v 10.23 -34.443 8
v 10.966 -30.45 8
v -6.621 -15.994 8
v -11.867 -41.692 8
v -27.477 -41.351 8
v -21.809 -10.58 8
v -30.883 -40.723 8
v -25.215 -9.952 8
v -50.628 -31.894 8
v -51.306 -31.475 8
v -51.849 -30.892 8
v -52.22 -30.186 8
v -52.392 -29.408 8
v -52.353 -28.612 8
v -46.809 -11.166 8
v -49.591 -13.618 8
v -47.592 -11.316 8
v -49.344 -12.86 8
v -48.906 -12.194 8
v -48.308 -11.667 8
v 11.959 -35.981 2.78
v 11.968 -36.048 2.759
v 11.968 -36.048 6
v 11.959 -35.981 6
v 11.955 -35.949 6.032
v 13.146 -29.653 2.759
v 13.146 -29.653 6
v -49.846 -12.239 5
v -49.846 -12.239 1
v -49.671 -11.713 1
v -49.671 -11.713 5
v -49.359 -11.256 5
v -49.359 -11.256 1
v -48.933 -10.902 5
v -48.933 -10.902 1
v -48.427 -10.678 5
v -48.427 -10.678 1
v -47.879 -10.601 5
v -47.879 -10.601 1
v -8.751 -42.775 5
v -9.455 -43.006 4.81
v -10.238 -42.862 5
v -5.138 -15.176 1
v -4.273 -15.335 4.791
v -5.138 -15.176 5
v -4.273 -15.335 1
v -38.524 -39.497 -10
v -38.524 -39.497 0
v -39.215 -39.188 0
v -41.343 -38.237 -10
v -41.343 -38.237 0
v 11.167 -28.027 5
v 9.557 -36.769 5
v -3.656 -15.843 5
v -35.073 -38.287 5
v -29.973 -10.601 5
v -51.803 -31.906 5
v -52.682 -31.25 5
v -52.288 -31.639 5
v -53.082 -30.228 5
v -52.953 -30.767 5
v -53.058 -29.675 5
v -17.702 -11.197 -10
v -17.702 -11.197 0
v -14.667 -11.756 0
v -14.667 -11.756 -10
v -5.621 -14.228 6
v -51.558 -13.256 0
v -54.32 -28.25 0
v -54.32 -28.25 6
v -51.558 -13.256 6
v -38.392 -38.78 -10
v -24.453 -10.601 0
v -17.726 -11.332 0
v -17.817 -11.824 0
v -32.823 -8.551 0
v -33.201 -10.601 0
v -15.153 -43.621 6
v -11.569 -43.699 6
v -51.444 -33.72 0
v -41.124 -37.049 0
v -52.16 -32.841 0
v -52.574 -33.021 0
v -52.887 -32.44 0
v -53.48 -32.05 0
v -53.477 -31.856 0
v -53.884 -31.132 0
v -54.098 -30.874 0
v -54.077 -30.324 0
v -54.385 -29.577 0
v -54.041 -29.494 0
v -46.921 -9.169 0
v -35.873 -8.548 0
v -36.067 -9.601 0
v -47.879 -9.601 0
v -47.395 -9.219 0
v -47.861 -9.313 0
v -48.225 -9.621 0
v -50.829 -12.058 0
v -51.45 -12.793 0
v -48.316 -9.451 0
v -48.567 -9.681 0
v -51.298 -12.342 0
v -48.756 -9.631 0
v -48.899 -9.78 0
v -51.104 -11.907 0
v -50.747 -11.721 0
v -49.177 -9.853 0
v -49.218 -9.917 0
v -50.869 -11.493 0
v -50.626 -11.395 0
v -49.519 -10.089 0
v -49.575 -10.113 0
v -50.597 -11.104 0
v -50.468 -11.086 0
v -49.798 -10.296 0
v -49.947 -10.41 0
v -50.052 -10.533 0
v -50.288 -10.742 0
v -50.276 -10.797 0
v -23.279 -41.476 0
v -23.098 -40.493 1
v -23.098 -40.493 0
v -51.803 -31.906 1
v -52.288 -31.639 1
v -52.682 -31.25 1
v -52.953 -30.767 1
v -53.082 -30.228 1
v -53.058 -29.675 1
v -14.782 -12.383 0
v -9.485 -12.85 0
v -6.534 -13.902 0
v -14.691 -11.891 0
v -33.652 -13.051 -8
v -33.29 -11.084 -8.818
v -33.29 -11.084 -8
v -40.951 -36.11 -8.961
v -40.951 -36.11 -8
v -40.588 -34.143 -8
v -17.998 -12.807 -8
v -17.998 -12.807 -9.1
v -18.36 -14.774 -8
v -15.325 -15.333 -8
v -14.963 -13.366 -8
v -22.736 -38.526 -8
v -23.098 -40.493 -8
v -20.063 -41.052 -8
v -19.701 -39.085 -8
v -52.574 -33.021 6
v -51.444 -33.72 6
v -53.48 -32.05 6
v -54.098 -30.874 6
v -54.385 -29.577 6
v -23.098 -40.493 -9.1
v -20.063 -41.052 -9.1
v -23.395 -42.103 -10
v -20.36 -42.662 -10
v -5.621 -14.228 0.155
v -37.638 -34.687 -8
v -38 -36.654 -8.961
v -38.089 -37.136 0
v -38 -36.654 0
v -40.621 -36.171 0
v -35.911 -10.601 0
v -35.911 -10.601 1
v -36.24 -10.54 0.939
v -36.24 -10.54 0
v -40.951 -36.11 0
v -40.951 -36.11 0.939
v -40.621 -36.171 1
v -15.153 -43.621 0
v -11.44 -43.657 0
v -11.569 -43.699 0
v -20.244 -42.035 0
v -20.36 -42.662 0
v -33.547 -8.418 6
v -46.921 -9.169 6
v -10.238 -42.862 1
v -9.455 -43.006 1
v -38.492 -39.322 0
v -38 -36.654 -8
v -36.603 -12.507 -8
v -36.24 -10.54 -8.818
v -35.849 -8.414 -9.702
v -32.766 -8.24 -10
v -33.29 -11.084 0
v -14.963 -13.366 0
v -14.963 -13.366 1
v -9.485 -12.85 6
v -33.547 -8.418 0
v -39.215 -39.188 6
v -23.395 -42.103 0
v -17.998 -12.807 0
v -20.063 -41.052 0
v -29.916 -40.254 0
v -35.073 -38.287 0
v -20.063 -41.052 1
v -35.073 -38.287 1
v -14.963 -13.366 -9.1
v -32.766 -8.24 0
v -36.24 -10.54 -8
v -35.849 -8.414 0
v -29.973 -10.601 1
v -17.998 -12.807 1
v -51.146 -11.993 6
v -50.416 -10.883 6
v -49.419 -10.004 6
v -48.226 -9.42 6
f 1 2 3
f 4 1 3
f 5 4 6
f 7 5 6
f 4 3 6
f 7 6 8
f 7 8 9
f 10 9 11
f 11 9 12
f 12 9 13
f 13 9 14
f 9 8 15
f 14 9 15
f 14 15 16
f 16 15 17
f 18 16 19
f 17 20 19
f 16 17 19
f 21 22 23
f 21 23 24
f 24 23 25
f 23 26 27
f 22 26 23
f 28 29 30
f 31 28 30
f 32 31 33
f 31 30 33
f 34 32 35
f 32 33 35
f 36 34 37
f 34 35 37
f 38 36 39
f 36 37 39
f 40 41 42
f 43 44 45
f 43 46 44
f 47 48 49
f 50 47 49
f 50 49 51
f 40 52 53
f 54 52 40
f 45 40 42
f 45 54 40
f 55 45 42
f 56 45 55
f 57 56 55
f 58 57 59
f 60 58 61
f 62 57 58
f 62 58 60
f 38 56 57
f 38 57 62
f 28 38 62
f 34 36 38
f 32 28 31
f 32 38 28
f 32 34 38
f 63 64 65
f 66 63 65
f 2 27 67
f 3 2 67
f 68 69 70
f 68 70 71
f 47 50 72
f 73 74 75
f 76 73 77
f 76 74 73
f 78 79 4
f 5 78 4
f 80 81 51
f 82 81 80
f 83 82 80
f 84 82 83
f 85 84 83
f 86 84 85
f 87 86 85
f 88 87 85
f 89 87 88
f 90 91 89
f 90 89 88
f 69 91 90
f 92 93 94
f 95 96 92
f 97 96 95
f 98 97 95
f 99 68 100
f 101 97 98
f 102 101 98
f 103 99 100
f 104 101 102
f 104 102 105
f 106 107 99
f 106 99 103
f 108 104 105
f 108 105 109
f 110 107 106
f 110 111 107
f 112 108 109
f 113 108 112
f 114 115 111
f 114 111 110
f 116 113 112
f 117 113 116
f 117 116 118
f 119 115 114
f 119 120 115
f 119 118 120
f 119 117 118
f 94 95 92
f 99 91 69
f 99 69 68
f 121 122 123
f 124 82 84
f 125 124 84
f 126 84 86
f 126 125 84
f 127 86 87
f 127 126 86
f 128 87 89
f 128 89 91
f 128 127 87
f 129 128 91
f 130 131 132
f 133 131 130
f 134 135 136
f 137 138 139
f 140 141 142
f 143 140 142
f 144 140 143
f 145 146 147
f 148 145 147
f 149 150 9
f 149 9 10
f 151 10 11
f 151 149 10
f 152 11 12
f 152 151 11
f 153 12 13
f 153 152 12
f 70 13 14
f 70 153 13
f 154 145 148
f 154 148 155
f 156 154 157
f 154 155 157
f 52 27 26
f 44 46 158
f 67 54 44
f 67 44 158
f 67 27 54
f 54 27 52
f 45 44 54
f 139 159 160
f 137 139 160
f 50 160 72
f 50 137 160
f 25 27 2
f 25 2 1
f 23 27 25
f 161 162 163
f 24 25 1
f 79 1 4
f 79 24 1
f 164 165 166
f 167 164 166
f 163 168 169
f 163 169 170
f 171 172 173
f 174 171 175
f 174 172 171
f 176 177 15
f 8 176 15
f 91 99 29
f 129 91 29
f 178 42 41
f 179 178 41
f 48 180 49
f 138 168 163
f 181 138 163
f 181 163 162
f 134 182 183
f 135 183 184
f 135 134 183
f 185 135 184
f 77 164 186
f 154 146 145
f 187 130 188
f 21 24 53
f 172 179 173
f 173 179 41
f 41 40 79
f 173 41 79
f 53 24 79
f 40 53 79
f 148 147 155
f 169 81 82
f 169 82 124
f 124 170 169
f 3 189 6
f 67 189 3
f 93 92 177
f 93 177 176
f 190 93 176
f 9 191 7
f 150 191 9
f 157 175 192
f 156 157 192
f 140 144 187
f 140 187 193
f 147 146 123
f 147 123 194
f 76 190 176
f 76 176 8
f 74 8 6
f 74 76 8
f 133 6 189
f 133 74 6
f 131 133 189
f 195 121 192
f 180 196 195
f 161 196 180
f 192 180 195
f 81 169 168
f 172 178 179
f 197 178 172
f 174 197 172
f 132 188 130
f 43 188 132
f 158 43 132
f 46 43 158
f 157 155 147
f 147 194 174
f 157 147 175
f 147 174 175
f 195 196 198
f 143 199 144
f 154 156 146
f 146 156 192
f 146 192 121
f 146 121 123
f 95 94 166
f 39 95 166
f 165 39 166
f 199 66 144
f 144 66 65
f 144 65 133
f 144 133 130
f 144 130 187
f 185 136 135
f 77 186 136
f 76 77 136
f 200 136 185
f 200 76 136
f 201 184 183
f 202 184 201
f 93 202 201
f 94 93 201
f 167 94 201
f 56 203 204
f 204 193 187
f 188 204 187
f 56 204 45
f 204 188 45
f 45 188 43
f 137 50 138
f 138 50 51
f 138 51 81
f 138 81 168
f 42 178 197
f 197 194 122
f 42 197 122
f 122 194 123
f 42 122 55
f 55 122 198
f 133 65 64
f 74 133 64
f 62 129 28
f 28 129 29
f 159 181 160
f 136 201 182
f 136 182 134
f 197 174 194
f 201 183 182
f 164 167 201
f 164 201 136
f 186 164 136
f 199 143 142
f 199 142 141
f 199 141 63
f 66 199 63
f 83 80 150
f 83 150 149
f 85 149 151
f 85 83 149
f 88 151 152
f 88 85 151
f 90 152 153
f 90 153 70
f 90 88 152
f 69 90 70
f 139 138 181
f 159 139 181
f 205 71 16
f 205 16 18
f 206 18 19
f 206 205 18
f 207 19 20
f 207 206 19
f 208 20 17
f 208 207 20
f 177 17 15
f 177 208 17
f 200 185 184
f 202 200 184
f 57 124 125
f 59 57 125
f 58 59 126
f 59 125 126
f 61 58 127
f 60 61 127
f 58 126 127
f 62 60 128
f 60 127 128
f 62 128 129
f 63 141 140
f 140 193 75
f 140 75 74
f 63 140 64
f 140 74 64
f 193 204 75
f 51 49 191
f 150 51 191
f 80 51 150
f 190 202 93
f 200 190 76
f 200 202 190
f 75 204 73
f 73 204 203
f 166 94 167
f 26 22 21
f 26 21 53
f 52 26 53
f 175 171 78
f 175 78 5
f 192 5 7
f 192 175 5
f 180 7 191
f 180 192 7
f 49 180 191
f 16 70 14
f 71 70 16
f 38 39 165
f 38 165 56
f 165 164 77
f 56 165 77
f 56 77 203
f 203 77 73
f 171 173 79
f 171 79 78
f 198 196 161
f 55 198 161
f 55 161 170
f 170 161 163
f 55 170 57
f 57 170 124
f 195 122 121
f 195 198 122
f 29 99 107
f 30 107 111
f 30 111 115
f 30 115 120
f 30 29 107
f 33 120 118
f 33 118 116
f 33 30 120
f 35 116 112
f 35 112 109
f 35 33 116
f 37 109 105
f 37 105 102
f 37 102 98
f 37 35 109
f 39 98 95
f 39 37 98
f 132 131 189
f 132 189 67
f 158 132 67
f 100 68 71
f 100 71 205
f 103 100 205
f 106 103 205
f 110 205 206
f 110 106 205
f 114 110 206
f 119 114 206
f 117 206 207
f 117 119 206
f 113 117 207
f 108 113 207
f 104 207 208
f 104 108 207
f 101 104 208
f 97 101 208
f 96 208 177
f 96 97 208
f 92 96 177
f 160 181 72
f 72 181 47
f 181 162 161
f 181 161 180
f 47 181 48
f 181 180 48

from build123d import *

# Parameters (mm, degrees)
BOSS_EXTRUDE1_DEPTH = 8
CUT_EXTRUDE1_DEPTH  = 5
CHAMFER1_SIZE       = 2
CHAMFER2_SIZE       = 2
BOSS_EXTRUDE2_DEPTH = 10
CHAMFER3_SIZE       = 5
CHAMFER5_SIZE       = 1
SKETCH4_W           = 3
SKETCH4_H           = 2
BOSS_EXTRUDE3_DEPTH = 2
CUT_EXTRUDE2_REACH  = 71.587
SKETCH8_W           = 3
SKETCH8_H           = 2
BOSS_EXTRUDE6_DEPTH = 2
SKETCH10_W          = 3.086016113
SKETCH10_H          = 2
BOSS_EXTRUDE7_DEPTH = 2
CUT_EXTRUDE6_REACH  = 65.526
CUT_EXTRUDE7_REACH  = 69.221
SKETCH14_W          = 3.086016113
SKETCH14_H          = 2
BOSS_EXTRUDE8_DEPTH = 2
CUT_EXTRUDE8_REACH  = 65.526
CUT_EXTRUDE9_DEPTH  = 10
CHAMFER6_SIZE       = 2


with BuildPart() as part:
    # Sketch1 → Boss-Extrude1 (new body)
    with BuildSketch(Plane.XY):
        with BuildLine():
            Line((-54.320190505, -28.24959399), (-51.558117567, -13.255731212))
            ThreePointArc((-51.558117567, -13.255731212), (-49.946755328, -10.410422216), (-46.921489424, -9.169439639))
            Line((-46.921489424, -9.169439639), (-33.546710063, -8.417567807))
            Line((-33.546710063, -8.417567807), (-9.484938073, -12.850072643))
            Line((-9.484938073, -12.850072643), (10.646906462, -20.027114874))
            ThreePointArc((10.646906462, -20.027114874), (13.299313006, -22.239005538), (13.885164949, -25.64260632))
            Line((13.885164949, -25.64260632), (11.241158147, -39.995549222))
            ThreePointArc((11.241158147, -39.995549222), (9.480940353, -42.966972131), (6.214468276, -44.088525055))
            Line((6.214468276, -44.088525055), (-15.153318385, -43.620772213))
            Line((-15.153318385, -43.620772213), (-39.215090375, -39.188267377))
            Line((-39.215090375, -39.188267377), (-51.444007577, -33.719847285))
            ThreePointArc((-51.444007577, -33.719847285), (-53.828484174, -31.482316748), (-54.320190505, -28.24959399))
        make_face()
    extrude(amount=BOSS_EXTRUDE1_DEPTH)

    # Sketch2 → Cut-Extrude1 (cut)
    with BuildSketch(Plane(origin=(0, 0, 0), x_dir=(-1, 0, 0), z_dir=(0, 0, -1))):
        with BuildLine():
            Line((53.057588595, -29.675312755), (49.84553587, -12.238742878))
            ThreePointArc((49.84553587, -12.238742878), (49.158345119, -11.064085999), (47.878630558, -10.601073521))
            Line((47.878630558, -10.601073521), (29.973319258, -10.601073521))
            Line((29.973319258, -10.601073521), (5.137929069, -15.176089324))
            Line((5.137929069, -15.176089324), (-10.10107167, -22.031458568))
            Line((-10.10107167, -22.031458568), (-10.675035013, -22.289659923))
            ThreePointArc((-10.675035013, -22.289659923), (-11.625784949, -23.184821715), (-11.821428067, -24.475931255))
            Line((-11.821428067, -24.475931255), (-8.921987001, -40.215494417))
            ThreePointArc((-8.921987001, -40.215494417), (-8.27911868, -41.352138774), (-7.071800124, -41.849755071))
            Line((-7.071800124, -41.849755071), (-6.443506549, -41.886484392))
            Line((-6.443506549, -41.886484392), (10.237987778, -42.861665394))
            Line((10.237987778, -42.861665394), (35.073377967, -38.286649591))
            Line((35.073377967, -38.286649591), (51.803353349, -31.906359903))
            ThreePointArc((51.803353349, -31.906359903), (52.834077643, -31.017733243), (53.057588595, -29.675312755))
        make_face()
    extrude(amount=-CUT_EXTRUDE1_DEPTH, mode=Mode.SUBTRACT)

    # Chamfer1
    chamfer1_edges = [part.edges().sort_by_distance(p)[0] for p in [
        (-4.469425054, -43.854648634, 8),
        (9.480940353, -42.966972131, 8),
        (12.563161548, -32.819077771, 8),
        (13.299313006, -22.239005538, 8),
        (0.580984195, -16.438593758, 8),
    ]]
    chamfer(chamfer1_edges, length=CHAMFER1_SIZE)

    # Chamfer2
    chamfer2_edges = [part.edges().sort_by_distance(p)[0] for p in [
        (-49.946755328, -10.410422216, 8),
        (-52.939154036, -20.752662601, 8),
        (-53.828484174, -31.482316748, 8),
        (-45.329548976, -36.454057331, 8),
        (-40.234099743, -8.793503723, 8),
    ]]
    chamfer(chamfer2_edges, length=CHAMFER2_SIZE)

    # Sketch3 → Boss-Extrude2 (add)
    with BuildSketch(Plane(origin=(0, 0, 0), x_dir=(-1, 0, 0), z_dir=(0, 0, -1))):
        Polygon((23.394716564, -42.102594861), (23.098142943, -40.492650345), (20.063192201, -41.051729445), (20.359765822, -42.661673961), align=None)
        Polygon((38.000366847, -36.653655449), (38.524189699, -39.49721829), (41.342508001, -38.236947396), (40.950724814, -36.110159485), align=None)
        Polygon((33.290068494, -11.083886396), (32.766245641, -8.240323555), (35.848643275, -8.413602522), (36.240426461, -10.540390432), align=None)
        Polygon((14.963133492, -13.366153375), (17.998084234, -12.807074275), (17.701510612, -11.197129759), (14.66655987, -11.756208859), align=None)
    extrude(amount=BOSS_EXTRUDE2_DEPTH)

    # Chamfer3
    # the kernel refuses this chamfer: 5 mm, written as the material it takes off along each edge
    with BuildSketch(Plane(origin=(-23.074487459, -43.612072424, 0), x_dir=(0.05833715256734155, -0.9979182097746037, -0.027495876610586372), z_dir=(0.998295648476819, 0.05835921720043501, 0))) as chamfer3_piece_1_section:
        Polygon((CHAMFER3_SIZE * 0.999621916911, -CHAMFER3_SIZE * 0.0274958766106), (-CHAMFER3_SIZE * 0.0274958766106, -CHAMFER3_SIZE * 0.999621916911), (0, 0), align=None)
    chamfer3_piece_1 = extrude(amount=30.197755173, mode=Mode.PRIVATE)
    chamfer3_piece_1 = split(chamfer3_piece_1, bisect_by=Plane(origin=(-2.089987913, -44.362637509, 2.130046666), z_dir=(0.18116532126255022, 0.9834526558873269, 0)), keep=Keep.TOP, mode=Mode.PRIVATE)
    add(chamfer3_piece_1, mode=Mode.SUBTRACT)
    with BuildSketch(Plane(origin=(6.95508169, -39.853163774, 0), x_dir=(0.9834526558873276, -0.18116532126254714, 0), z_dir=(0.18116532126254714, 0.9834526558873276, 0))) as chamfer3_piece_2:
        Polygon((2 + CHAMFER3_SIZE, 0), (2, -CHAMFER3_SIZE), (2, 0), align=None)
    revolve(axis=Axis((6.95508169, -39.853163774, 0), (0, 0, -1)), revolution_arc=76.216718402, mode=Mode.SUBTRACT)
    with BuildSketch(Plane(origin=(11.821428067, -24.475931255, 0), x_dir=(0.9830808290695956, -0.18109682571832125, -0.027495876610586386), z_dir=(-0.18116532126255008, -0.9834526558873269, 0))) as chamfer3_piece_3:
        Polygon((CHAMFER3_SIZE * 0.999621916911, CHAMFER3_SIZE * 0.0274958766106), (-CHAMFER3_SIZE * 0.0274958766106, CHAMFER3_SIZE * 0.999621916911), (0, 0), align=None)
    extrude(amount=16.004393366, mode=Mode.SUBTRACT)
    with BuildSketch(Plane(origin=(9.854522756, -24.113600612, 0), x_dir=(0.41025612875981127, 0.9119703442629113, 0), z_dir=(-0.9119703442629113, 0.41025612875981127, 0))) as chamfer3_piece_4:
        Polygon((2 + CHAMFER3_SIZE, 0), (2, -CHAMFER3_SIZE), (2, 0), align=None)
    revolve(axis=Axis((9.854522756, -24.113600612, 0), (0, 0, -1)), revolution_arc=76.216718402, mode=Mode.SUBTRACT)
    with BuildSketch(Plane(origin=(10.675035013, -22.289659923, 0), x_dir=(0.4101010178554897, 0.911625543698347, -0.02749587661058636), z_dir=(-0.9119703442629117, 0.41025612875981066, 0))) as chamfer3_piece_5_section:
        Polygon((CHAMFER3_SIZE * 0.999621916911, -CHAMFER3_SIZE * 0.0274958766106), (-CHAMFER3_SIZE * 0.0274958766106, -CHAMFER3_SIZE * 0.999621916911), (0, 0), align=None)
    chamfer3_piece_5 = extrude(amount=30.197755173, mode=Mode.PRIVATE)
    chamfer3_piece_5 = split(chamfer3_piece_5, bisect_by=Plane(origin=(3.019797747, -16.678853276, 2.155995237), z_dir=(-0.18116532126254994, -0.983452655887327, 0)), keep=Keep.TOP, mode=Mode.PRIVATE)
    add(chamfer3_piece_5, mode=Mode.SUBTRACT)

    # Chamfer5
    # the kernel refuses this chamfer: 1 mm, written as the material it takes off along each edge
    with BuildSketch(Plane(origin=(-23.098142943, -40.492650345, 0), x_dir=(0.004981299321445123, 0.02704089288890644, 0.9996219169110092), z_dir=(-0.9834526558873269, 0.18116532126255022, 0))) as chamfer5_piece_1_section:
        Polygon((CHAMFER5_SIZE * 0.999621916911, -CHAMFER5_SIZE * 0.0274958766104), (-CHAMFER5_SIZE * 0.027495876621, -CHAMFER5_SIZE * 0.999621916911), (0, 0), align=None)
    chamfer5_piece_1 = extrude(amount=14.748410513, mode=Mode.PRIVATE)
    chamfer5_piece_1 = split(chamfer5_piece_1, bisect_by=Plane(origin=(-28.668481956, -40.729276734, 0.347878309), z_dir=(0.35633503270067046, 0.9343582527436745, 0)), keep=Keep.TOP, mode=Mode.PRIVATE)
    add(chamfer5_piece_1, mode=Mode.SUBTRACT)
    with BuildSketch(Plane(origin=(-38.218434546, -37.087223316, 0), x_dir=(-0.3562003084508938, -0.9340049876895217, -0.02749587661058614), z_dir=(-0.9343582527436745, 0.35633503270067046, 0))) as chamfer5_piece_2_section:
        Polygon((CHAMFER5_SIZE * 0.999621916911, CHAMFER5_SIZE * 0.0274958766106), (-CHAMFER5_SIZE * 0.0274958766106, CHAMFER5_SIZE * 0.999621916911), (0, 0), align=None)
    chamfer5_piece_2 = extrude(amount=14.53930413, mode=Mode.PRIVATE)
    chamfer5_piece_2 = split(chamfer5_piece_2, bisect_by=Plane(origin=(-40.84035239, -36.130491583, 0.489990554), z_dir=(0.18116532126254972, 0.983452655887327, 0)), keep=Keep.TOP, mode=Mode.PRIVATE)
    add(chamfer5_piece_2, mode=Mode.SUBTRACT)
    with BuildSketch(Plane(origin=(-38.218434546, -37.087223316, 0), x_dir=(-0.3562003084508938, -0.9340049876895217, -0.02749587661058614), z_dir=(-0.9343582527436745, 0.35633503270067046, 0))) as chamfer5_piece_3_section:
        Polygon((CHAMFER5_SIZE * 0.999621916911, CHAMFER5_SIZE * 0.0274958766106), (-CHAMFER5_SIZE * 0.0274958766106, CHAMFER5_SIZE * 0.999621916911), (0, 0), align=None)
    chamfer5_piece_3 = extrude(amount=14.53930413, mode=Mode.PRIVATE)
    chamfer5_piece_3 = split(chamfer5_piece_3, bisect_by=Plane(origin=(-40.993983544, -36.344988713, 0.234829228), z_dir=(-0.9834526558873267, 0.18116532126255175, 0)), keep=Keep.TOP, mode=Mode.PRIVATE)
    add(chamfer5_piece_3, mode=Mode.SUBTRACT)
    with BuildSketch(Plane(origin=(1.897012872, -16.472021069, 0), x_dir=(-0.004981299319533664, -0.02704089287863599, 0.9996219169112968), z_dir=(-0.9834526558873531, 0.18116532126240795, 1.5207756333546186e-14))) as chamfer5_piece_4:
        Polygon((CHAMFER5_SIZE * 0.999621916911, CHAMFER5_SIZE * 0.0274958766106), (-CHAMFER5_SIZE * 0.0274958766106, CHAMFER5_SIZE * 0.999621916911), (0, 0), align=None)
    extrude(amount=17.143831239, mode=Mode.SUBTRACT)
    with BuildSketch(Plane(origin=(-32.502447723, -10.135173746, 0), x_dir=(-0.00498129931955216, -0.02704089287863057, 0.9996219169112968), z_dir=(0.983452655887327, -0.18116532126254994, 0))) as chamfer5_piece_5_section:
        Polygon((CHAMFER5_SIZE * 0.999621916911, -CHAMFER5_SIZE * 0.0274958766106), (-CHAMFER5_SIZE * 0.0274958766106, -CHAMFER5_SIZE * 0.999621916911), (0, 0), align=None)
    chamfer5_piece_5 = extrude(amount=14.748410513, mode=Mode.PRIVATE)
    chamfer5_piece_5 = split(chamfer5_piece_5, bisect_by=Plane(origin=(-23.118458189, -10.601073521, 0.347878309), z_dir=(0, -1, 0)), keep=Keep.TOP, mode=Mode.PRIVATE)
    add(chamfer5_piece_5, mode=Mode.SUBTRACT)
    with BuildSketch(Plane(origin=(-20.063192201, -41.051729445, 0), x_dir=(0.004981299321182515, 0.027040892887405597, 0.9996219169110512), z_dir=(0.9834526558873424, -0.18116532126246593, -1.60020737234311e-14))) as chamfer5_piece_6:
        Polygon((CHAMFER5_SIZE * 0.999621916911, CHAMFER5_SIZE * 0.0274958766105), (-CHAMFER5_SIZE * 0.0274958766195, CHAMFER5_SIZE * 0.999621916911), (0, 0), align=None)
    extrude(amount=17.991435412, mode=Mode.SUBTRACT)
    with BuildSketch(Plane(origin=(-51.090683283, -30.037643398, 0), x_dir=(-0.35633503270066896, -0.934358252743675, 0), z_dir=(0.934358252743675, -0.35633503270066896, 0))) as chamfer5_piece_7:
        Polygon((2 + CHAMFER5_SIZE, 0), (2, -CHAMFER5_SIZE), (2, 0), align=None)
    revolve(axis=Axis((-51.090683283, -30.037643398, 0), (0, 0, -1)), revolution_arc=79.562356174, mode=Mode.SUBTRACT)
    with BuildSketch(Plane(origin=(-53.057588595, -29.675312755, 0), x_dir=(-0.9830808290695958, 0.18109682571832017, -0.027495876610586695), z_dir=(0.18116532126254906, 0.9834526558873271, 0))) as chamfer5_piece_8:
        Polygon((CHAMFER5_SIZE * 0.999621916911, CHAMFER5_SIZE * 0.0274958766106), (-CHAMFER5_SIZE * 0.0274958766106, CHAMFER5_SIZE * 0.999621916911), (0, 0), align=None)
    extrude(amount=17.729953519, mode=Mode.SUBTRACT)
    with BuildSketch(Plane(origin=(-47.878630558, -12.601073521, 0), x_dir=(-0.983452655887328, 0.1811653212625444, 0), z_dir=(-0.1811653212625444, -0.983452655887328, 0))) as chamfer5_piece_9:
        Polygon((2 + CHAMFER5_SIZE, 0), (2, -CHAMFER5_SIZE), (2, 0), align=None)
    revolve(axis=Axis((-47.878630558, -12.601073521, 0), (0, 0, -1)), revolution_arc=79.562356174, mode=Mode.SUBTRACT)
    with BuildSketch(Plane(origin=(-47.878630558, -10.601073521, 0), x_dir=(0, 0.9996219169112968, -0.02749587661058632), z_dir=(1, 0, 0))) as chamfer5_piece_10_section:
        Polygon((CHAMFER5_SIZE * 0.999621916911, CHAMFER5_SIZE * 0.0274958766106), (-CHAMFER5_SIZE * 0.0274958766106, CHAMFER5_SIZE * 0.999621916911), (0, 0), align=None)
    chamfer5_piece_10 = extrude(amount=14.53930413, mode=Mode.PRIVATE)
    chamfer5_piece_10 = split(chamfer5_piece_10, bisect_by=Plane(origin=(-42.562463458, -9.375785449, 0.347894449), z_dir=(-0.18116532126254817, -0.9834526558873274, 0)), keep=Keep.TOP, mode=Mode.PRIVATE)
    add(chamfer5_piece_10, mode=Mode.SUBTRACT)
    with BuildSketch(Plane(origin=(-47.878630558, -10.601073521, 0), x_dir=(0, 0.9996219169112968, -0.02749587661058632), z_dir=(1, 0, 0))) as chamfer5_piece_11_section:
        Polygon((CHAMFER5_SIZE * 0.999621916911, CHAMFER5_SIZE * 0.0274958766106), (-CHAMFER5_SIZE * 0.0274958766106, CHAMFER5_SIZE * 0.999621916911), (0, 0), align=None)
    chamfer5_piece_11 = extrude(amount=14.53930413, mode=Mode.PRIVATE)
    chamfer5_piece_11 = split(chamfer5_piece_11, bisect_by=Plane(origin=(-36.197167732, -10.305561204, 0.234829228), z_dir=(-0.9834526558873272, 0.1811653212625484, 0)), keep=Keep.TOP, mode=Mode.PRIVATE)
    add(chamfer5_piece_11, mode=Mode.SUBTRACT)

    # Sketch4 → Boss-Extrude3 (add)
    with BuildSketch(Plane(origin=(-7.777695995, -42.221081437, 0), x_dir=(0.9834526558873268, -0.18116532126255072, 0), z_dir=(0.18116532126255072, 0.9834526558873268, 0))):
        with Locations((-32.231190435, 9)):
            Rectangle(SKETCH4_W, SKETCH4_H)
    extrude(amount=BOSS_EXTRUDE3_DEPTH)

    # Sketch5 → Cut-Extrude2 (cut, up to next)
    with BuildSketch(Plane(origin=(-33.17302882, 6.110921952, 0), x_dir=(0, 0, 1), z_dir=(-0.9834526558873264, 0.18116532126255258, 0)), mode=Mode.PRIVATE) as cut_extrude2_sk1:
        Polygon((-8, -40.931483467), (-10, -45.094056213), (-10, -40.931483467), align=None)
    cut_extrude2_tool1 = extrude(cut_extrude2_sk1.sketch, amount=-CUT_EXTRUDE2_REACH, mode=Mode.PRIVATE) & part.part
    add(cut_extrude2_tool1.solids().sort_by_distance((-40.839765, -35.507819, -9.333333))[0], mode=Mode.SUBTRACT)

    # Sketch8 → Boss-Extrude6 (add)
    with BuildSketch(Plane(origin=(-3.067397642, -16.651312384, 0), x_dir=(0.9834526558873273, -0.1811653212625481, 0), z_dir=(-0.1811653212625481, -0.9834526558873273, 0))):
        with Locations((-32.231190435, -9)):
            Rectangle(SKETCH8_W, SKETCH8_H)
    extrude(amount=BOSS_EXTRUDE6_DEPTH)

    # Sketch10 → Boss-Extrude7 (add)
    with BuildSketch(Plane(origin=(-2.872517463, -15.593408876, 0), x_dir=(0.983452655887327, -0.18116532126255, 0), z_dir=(-0.18116532126255, -0.983452655887327, 0))):
        with Locations((-13.837057959, -9)):
            Rectangle(SKETCH10_W, SKETCH10_H)
    extrude(amount=BOSS_EXTRUDE7_DEPTH)

    # Sketch12 → Cut-Extrude6 (cut, up to next)
    with BuildSketch(Plane(origin=(-12.090616028, 2.2272555, 0), x_dir=(0, 0, -1), z_dir=(0.9834526558873278, -0.18116532126254553, 0)), mode=Mode.PRIVATE) as cut_extrude6_sk1:
        Polygon((8, -17.855779922), (10, -14.218746856), (10, -17.855779922), align=None)
    cut_extrude6_tool1 = extrude(cut_extrude6_sk1.sketch, amount=-CUT_EXTRUDE6_REACH, mode=Mode.PRIVATE) & part.part
    add(cut_extrude6_tool1.solids().sort_by_distance((-15.105829, -14.140775, -9.333333))[0], mode=Mode.SUBTRACT)

    # Sketch13 → Cut-Extrude7 (cut, up to next)
    with BuildSketch(Plane(origin=(-30.222670852, 5.567425988, 0), x_dir=(0, 0, -1), z_dir=(0.9834526558873274, -0.18116532126254756, 0)), mode=Mode.PRIVATE) as cut_extrude7_sk1:
        Polygon((8, -18.931483467), (10, -14.040075503), (10, -18.931483467), align=None)
    cut_extrude7_tool1 = extrude(cut_extrude7_sk1.sketch, amount=-CUT_EXTRUDE7_REACH, mode=Mode.PRIVATE) & part.part
    add(cut_extrude7_tool1.solids().sort_by_distance((-33.357015, -11.447302, -9.333333))[0], mode=Mode.SUBTRACT)

    # Sketch14 → Boss-Extrude8 (add)
    with BuildSketch(Plane(origin=(-7.972576173, -43.278984945, 0), x_dir=(0.9834526558873271, -0.18116532126254975, 0), z_dir=(0.18116532126254975, 0.9834526558873271, 0))):
        with Locations((-13.837057959, 9)):
            Rectangle(SKETCH14_W, SKETCH14_H)
    extrude(amount=BOSS_EXTRUDE8_DEPTH)

    # Sketch15 → Cut-Extrude8 (cut, up to next)
    with BuildSketch(Plane(origin=(-12.090616028, 2.2272555, 0), x_dir=(0, 0, -1), z_dir=(0.9834526558873269, -0.18116532126255053, 0)), mode=Mode.PRIVATE) as cut_extrude8_sk1:
        Polygon((8, -42.007187012), (10, -45.644220078), (10, -42.007187012), align=None)
    cut_extrude8_tool1 = extrude(cut_extrude8_sk1.sketch, amount=-CUT_EXTRUDE8_REACH, mode=Mode.PRIVATE) & part.part
    add(cut_extrude8_tool1.solids().sort_by_distance((-19.920496, -40.277107, -9.333333))[0], mode=Mode.SUBTRACT)

    # Sketch17 → Cut-Extrude9 (cut)
    with BuildSketch(Plane.XY.offset(8)):
        Polygon((13.146341231, -29.653297454), (-7.687958424, -12.528604727), (18.211690395, -20.597072459), align=None)
        Polygon((-13.66636111, -44.387279773), (13.396428243, -46.257416903), (11.958940519, -35.980909599), align=None)
    extrude(amount=-CUT_EXTRUDE9_DEPTH, mode=Mode.SUBTRACT)

    # Chamfer6
    chamfer6_edges = [part.edges().sort_by_distance(p)[0] for p in [
        (5.160529327, -23.08938231, 8),
        (1.9826537, -39.253626587, 8),
    ]]
    chamfer(chamfer6_edges, length=CHAMFER6_SIZE)


solid = part.part
